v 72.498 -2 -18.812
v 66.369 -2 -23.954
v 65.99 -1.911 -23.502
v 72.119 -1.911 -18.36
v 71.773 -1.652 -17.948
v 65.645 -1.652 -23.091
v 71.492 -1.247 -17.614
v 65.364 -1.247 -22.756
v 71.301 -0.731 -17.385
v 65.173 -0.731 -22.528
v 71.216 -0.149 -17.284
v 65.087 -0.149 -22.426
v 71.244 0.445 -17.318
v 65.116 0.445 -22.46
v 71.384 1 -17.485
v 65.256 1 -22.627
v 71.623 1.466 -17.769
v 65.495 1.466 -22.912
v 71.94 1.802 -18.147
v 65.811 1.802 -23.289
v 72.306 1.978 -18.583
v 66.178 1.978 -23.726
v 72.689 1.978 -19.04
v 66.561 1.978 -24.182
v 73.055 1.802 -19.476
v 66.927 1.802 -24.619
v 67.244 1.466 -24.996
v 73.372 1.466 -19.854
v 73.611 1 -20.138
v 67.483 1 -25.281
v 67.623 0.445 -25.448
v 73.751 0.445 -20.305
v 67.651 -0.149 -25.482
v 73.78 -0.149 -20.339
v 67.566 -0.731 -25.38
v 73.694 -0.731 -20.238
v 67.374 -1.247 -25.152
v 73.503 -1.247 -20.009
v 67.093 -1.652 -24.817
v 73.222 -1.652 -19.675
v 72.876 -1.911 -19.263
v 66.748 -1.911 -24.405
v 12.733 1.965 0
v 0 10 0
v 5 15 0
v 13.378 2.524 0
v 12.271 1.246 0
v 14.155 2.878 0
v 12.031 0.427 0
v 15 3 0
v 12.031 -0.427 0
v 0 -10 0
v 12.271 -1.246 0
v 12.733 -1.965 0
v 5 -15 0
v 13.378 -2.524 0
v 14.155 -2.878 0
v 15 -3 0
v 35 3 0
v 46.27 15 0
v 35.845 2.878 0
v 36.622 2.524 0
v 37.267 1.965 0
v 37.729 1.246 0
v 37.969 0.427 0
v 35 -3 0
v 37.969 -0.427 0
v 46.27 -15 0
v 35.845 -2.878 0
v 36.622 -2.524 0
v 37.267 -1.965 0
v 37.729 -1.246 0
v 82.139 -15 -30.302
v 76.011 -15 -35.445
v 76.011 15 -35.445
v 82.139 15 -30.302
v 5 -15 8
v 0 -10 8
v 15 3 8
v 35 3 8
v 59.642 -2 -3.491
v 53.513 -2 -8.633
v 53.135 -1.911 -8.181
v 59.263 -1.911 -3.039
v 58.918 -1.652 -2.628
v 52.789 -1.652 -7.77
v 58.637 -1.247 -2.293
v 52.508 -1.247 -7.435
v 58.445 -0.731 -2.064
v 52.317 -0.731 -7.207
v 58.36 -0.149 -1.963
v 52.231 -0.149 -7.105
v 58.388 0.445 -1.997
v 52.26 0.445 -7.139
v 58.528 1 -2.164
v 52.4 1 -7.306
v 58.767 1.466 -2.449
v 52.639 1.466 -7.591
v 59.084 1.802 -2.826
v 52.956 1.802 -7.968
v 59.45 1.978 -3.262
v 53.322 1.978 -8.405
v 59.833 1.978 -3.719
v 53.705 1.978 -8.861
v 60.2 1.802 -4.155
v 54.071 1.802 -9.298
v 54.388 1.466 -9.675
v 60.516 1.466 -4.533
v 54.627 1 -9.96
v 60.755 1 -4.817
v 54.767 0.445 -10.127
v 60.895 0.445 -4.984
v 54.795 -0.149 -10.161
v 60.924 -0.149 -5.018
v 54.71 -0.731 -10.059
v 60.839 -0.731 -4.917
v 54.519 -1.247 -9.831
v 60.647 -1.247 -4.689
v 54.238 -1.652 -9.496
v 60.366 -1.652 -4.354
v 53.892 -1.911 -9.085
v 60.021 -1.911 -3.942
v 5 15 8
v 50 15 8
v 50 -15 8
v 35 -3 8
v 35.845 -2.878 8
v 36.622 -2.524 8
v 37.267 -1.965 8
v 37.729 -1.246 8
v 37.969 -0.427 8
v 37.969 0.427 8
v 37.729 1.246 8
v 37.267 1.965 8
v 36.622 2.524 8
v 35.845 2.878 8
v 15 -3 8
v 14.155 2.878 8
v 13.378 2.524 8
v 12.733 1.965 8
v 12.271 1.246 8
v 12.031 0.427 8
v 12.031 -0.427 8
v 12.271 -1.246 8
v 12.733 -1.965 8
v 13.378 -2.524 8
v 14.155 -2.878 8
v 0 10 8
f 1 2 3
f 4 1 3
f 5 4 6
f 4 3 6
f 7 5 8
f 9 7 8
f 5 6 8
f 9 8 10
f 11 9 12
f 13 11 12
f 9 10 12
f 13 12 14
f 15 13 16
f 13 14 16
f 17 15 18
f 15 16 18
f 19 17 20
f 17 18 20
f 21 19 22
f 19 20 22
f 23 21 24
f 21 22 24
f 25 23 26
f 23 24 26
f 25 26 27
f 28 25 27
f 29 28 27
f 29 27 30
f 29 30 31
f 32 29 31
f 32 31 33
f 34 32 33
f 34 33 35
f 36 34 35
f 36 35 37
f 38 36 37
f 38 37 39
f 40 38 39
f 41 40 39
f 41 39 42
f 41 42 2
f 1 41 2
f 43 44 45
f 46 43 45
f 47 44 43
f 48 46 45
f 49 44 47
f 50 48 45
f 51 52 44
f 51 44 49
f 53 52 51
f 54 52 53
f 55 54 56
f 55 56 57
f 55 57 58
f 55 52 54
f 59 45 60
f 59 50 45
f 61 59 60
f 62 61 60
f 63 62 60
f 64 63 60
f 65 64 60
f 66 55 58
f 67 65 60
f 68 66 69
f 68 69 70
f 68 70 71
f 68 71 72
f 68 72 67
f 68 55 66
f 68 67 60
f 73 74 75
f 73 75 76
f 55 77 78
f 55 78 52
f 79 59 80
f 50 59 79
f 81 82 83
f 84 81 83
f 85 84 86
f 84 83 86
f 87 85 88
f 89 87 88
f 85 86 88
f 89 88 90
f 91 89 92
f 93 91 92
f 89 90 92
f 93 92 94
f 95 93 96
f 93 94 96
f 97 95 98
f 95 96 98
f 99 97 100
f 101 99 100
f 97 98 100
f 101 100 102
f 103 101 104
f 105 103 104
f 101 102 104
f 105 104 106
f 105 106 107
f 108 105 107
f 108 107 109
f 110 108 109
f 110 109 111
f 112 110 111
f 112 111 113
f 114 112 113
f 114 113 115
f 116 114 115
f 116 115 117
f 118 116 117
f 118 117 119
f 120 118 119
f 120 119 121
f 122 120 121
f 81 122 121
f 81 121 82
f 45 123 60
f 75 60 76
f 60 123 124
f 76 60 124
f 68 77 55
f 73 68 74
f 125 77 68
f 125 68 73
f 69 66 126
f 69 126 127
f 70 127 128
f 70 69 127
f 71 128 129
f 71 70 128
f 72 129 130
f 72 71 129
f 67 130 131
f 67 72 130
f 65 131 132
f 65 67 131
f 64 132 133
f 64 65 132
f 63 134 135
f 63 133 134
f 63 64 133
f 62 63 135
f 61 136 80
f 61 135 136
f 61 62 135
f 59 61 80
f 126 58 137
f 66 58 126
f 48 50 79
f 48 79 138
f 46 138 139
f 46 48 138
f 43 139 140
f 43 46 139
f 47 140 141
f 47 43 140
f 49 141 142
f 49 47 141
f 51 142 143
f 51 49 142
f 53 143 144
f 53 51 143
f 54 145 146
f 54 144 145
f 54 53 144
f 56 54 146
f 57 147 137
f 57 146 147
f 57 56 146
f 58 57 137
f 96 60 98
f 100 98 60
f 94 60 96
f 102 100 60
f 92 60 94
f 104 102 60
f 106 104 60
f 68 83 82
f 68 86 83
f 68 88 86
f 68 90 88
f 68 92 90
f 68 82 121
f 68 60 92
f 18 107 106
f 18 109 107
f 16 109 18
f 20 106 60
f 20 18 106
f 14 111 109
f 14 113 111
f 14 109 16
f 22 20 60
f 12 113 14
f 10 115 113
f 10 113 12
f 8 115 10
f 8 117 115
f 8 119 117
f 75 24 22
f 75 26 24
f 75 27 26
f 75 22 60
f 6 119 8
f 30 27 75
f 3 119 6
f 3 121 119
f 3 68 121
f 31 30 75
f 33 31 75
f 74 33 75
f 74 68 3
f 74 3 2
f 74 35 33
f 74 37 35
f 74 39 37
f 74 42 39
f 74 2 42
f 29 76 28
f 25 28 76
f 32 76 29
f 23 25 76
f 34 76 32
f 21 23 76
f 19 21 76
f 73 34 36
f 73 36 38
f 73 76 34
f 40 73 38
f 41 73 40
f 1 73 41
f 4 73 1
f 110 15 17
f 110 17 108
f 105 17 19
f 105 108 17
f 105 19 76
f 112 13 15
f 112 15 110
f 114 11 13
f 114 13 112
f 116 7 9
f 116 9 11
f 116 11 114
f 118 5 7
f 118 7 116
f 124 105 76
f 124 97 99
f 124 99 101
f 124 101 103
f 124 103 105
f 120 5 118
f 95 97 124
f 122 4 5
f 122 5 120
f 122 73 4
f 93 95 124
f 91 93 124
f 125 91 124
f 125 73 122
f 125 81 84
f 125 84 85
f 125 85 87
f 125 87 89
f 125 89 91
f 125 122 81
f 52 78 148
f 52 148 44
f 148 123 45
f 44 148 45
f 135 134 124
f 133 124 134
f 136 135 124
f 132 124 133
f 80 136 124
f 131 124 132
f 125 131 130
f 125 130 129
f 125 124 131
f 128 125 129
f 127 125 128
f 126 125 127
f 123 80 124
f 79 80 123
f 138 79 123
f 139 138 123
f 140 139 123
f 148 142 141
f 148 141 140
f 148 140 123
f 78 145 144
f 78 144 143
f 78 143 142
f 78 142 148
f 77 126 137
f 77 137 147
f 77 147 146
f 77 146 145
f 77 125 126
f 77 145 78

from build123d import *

# Parameters (mm, degrees)
F1_DEPTH = 15
F3_DEPTH = 8.001
F5_D     = 4
F6_SIZE  = 5


with BuildPart() as f1:
    # F0 (on Front) → F1 (new body, symmetric)
    with BuildSketch(Plane.XZ):
        Polygon((0, 8), (0, 0), (46.2695387348, 0), (76.0110249394, -35.4445230334), (82.1393804843, -30.3022221559), (50, 8), align=None)
    extrude(amount=F1_DEPTH, both=True)

    # F2 (on Top) → F3 (cut, through all)
    with BuildSketch(Plane.XY):
        with BuildLine():
            ThreePointArc((15, 3), (12, 0), (15, -3))
            Line((15, -3), (35, -3))
            ThreePointArc((35, -3), (38, 0), (35, 3))
            Line((35, 3), (15, 3))
        make_face()
    extrude(amount=F3_DEPTH, mode=Mode.SUBTRACT)

    # F5 (through all)
    with Locations(Plane(origin=(33.2804354537, 0, 27.9256011146), x_dir=(0, 1, 0), z_dir=(0.7660444431, 0, 0.6427876097))):
        with Locations((0, -61.0110249394), (0, -41.0110249394)):
            Hole(F5_D / 2)

    # F6
    f6_edges = [f1.edges().sort_by_distance(p)[0] for p in [
        (0, 15, 4),
        (0, -15, 4),
    ]]
    chamfer(f6_edges, length=F6_SIZE)


solid = f1.part
